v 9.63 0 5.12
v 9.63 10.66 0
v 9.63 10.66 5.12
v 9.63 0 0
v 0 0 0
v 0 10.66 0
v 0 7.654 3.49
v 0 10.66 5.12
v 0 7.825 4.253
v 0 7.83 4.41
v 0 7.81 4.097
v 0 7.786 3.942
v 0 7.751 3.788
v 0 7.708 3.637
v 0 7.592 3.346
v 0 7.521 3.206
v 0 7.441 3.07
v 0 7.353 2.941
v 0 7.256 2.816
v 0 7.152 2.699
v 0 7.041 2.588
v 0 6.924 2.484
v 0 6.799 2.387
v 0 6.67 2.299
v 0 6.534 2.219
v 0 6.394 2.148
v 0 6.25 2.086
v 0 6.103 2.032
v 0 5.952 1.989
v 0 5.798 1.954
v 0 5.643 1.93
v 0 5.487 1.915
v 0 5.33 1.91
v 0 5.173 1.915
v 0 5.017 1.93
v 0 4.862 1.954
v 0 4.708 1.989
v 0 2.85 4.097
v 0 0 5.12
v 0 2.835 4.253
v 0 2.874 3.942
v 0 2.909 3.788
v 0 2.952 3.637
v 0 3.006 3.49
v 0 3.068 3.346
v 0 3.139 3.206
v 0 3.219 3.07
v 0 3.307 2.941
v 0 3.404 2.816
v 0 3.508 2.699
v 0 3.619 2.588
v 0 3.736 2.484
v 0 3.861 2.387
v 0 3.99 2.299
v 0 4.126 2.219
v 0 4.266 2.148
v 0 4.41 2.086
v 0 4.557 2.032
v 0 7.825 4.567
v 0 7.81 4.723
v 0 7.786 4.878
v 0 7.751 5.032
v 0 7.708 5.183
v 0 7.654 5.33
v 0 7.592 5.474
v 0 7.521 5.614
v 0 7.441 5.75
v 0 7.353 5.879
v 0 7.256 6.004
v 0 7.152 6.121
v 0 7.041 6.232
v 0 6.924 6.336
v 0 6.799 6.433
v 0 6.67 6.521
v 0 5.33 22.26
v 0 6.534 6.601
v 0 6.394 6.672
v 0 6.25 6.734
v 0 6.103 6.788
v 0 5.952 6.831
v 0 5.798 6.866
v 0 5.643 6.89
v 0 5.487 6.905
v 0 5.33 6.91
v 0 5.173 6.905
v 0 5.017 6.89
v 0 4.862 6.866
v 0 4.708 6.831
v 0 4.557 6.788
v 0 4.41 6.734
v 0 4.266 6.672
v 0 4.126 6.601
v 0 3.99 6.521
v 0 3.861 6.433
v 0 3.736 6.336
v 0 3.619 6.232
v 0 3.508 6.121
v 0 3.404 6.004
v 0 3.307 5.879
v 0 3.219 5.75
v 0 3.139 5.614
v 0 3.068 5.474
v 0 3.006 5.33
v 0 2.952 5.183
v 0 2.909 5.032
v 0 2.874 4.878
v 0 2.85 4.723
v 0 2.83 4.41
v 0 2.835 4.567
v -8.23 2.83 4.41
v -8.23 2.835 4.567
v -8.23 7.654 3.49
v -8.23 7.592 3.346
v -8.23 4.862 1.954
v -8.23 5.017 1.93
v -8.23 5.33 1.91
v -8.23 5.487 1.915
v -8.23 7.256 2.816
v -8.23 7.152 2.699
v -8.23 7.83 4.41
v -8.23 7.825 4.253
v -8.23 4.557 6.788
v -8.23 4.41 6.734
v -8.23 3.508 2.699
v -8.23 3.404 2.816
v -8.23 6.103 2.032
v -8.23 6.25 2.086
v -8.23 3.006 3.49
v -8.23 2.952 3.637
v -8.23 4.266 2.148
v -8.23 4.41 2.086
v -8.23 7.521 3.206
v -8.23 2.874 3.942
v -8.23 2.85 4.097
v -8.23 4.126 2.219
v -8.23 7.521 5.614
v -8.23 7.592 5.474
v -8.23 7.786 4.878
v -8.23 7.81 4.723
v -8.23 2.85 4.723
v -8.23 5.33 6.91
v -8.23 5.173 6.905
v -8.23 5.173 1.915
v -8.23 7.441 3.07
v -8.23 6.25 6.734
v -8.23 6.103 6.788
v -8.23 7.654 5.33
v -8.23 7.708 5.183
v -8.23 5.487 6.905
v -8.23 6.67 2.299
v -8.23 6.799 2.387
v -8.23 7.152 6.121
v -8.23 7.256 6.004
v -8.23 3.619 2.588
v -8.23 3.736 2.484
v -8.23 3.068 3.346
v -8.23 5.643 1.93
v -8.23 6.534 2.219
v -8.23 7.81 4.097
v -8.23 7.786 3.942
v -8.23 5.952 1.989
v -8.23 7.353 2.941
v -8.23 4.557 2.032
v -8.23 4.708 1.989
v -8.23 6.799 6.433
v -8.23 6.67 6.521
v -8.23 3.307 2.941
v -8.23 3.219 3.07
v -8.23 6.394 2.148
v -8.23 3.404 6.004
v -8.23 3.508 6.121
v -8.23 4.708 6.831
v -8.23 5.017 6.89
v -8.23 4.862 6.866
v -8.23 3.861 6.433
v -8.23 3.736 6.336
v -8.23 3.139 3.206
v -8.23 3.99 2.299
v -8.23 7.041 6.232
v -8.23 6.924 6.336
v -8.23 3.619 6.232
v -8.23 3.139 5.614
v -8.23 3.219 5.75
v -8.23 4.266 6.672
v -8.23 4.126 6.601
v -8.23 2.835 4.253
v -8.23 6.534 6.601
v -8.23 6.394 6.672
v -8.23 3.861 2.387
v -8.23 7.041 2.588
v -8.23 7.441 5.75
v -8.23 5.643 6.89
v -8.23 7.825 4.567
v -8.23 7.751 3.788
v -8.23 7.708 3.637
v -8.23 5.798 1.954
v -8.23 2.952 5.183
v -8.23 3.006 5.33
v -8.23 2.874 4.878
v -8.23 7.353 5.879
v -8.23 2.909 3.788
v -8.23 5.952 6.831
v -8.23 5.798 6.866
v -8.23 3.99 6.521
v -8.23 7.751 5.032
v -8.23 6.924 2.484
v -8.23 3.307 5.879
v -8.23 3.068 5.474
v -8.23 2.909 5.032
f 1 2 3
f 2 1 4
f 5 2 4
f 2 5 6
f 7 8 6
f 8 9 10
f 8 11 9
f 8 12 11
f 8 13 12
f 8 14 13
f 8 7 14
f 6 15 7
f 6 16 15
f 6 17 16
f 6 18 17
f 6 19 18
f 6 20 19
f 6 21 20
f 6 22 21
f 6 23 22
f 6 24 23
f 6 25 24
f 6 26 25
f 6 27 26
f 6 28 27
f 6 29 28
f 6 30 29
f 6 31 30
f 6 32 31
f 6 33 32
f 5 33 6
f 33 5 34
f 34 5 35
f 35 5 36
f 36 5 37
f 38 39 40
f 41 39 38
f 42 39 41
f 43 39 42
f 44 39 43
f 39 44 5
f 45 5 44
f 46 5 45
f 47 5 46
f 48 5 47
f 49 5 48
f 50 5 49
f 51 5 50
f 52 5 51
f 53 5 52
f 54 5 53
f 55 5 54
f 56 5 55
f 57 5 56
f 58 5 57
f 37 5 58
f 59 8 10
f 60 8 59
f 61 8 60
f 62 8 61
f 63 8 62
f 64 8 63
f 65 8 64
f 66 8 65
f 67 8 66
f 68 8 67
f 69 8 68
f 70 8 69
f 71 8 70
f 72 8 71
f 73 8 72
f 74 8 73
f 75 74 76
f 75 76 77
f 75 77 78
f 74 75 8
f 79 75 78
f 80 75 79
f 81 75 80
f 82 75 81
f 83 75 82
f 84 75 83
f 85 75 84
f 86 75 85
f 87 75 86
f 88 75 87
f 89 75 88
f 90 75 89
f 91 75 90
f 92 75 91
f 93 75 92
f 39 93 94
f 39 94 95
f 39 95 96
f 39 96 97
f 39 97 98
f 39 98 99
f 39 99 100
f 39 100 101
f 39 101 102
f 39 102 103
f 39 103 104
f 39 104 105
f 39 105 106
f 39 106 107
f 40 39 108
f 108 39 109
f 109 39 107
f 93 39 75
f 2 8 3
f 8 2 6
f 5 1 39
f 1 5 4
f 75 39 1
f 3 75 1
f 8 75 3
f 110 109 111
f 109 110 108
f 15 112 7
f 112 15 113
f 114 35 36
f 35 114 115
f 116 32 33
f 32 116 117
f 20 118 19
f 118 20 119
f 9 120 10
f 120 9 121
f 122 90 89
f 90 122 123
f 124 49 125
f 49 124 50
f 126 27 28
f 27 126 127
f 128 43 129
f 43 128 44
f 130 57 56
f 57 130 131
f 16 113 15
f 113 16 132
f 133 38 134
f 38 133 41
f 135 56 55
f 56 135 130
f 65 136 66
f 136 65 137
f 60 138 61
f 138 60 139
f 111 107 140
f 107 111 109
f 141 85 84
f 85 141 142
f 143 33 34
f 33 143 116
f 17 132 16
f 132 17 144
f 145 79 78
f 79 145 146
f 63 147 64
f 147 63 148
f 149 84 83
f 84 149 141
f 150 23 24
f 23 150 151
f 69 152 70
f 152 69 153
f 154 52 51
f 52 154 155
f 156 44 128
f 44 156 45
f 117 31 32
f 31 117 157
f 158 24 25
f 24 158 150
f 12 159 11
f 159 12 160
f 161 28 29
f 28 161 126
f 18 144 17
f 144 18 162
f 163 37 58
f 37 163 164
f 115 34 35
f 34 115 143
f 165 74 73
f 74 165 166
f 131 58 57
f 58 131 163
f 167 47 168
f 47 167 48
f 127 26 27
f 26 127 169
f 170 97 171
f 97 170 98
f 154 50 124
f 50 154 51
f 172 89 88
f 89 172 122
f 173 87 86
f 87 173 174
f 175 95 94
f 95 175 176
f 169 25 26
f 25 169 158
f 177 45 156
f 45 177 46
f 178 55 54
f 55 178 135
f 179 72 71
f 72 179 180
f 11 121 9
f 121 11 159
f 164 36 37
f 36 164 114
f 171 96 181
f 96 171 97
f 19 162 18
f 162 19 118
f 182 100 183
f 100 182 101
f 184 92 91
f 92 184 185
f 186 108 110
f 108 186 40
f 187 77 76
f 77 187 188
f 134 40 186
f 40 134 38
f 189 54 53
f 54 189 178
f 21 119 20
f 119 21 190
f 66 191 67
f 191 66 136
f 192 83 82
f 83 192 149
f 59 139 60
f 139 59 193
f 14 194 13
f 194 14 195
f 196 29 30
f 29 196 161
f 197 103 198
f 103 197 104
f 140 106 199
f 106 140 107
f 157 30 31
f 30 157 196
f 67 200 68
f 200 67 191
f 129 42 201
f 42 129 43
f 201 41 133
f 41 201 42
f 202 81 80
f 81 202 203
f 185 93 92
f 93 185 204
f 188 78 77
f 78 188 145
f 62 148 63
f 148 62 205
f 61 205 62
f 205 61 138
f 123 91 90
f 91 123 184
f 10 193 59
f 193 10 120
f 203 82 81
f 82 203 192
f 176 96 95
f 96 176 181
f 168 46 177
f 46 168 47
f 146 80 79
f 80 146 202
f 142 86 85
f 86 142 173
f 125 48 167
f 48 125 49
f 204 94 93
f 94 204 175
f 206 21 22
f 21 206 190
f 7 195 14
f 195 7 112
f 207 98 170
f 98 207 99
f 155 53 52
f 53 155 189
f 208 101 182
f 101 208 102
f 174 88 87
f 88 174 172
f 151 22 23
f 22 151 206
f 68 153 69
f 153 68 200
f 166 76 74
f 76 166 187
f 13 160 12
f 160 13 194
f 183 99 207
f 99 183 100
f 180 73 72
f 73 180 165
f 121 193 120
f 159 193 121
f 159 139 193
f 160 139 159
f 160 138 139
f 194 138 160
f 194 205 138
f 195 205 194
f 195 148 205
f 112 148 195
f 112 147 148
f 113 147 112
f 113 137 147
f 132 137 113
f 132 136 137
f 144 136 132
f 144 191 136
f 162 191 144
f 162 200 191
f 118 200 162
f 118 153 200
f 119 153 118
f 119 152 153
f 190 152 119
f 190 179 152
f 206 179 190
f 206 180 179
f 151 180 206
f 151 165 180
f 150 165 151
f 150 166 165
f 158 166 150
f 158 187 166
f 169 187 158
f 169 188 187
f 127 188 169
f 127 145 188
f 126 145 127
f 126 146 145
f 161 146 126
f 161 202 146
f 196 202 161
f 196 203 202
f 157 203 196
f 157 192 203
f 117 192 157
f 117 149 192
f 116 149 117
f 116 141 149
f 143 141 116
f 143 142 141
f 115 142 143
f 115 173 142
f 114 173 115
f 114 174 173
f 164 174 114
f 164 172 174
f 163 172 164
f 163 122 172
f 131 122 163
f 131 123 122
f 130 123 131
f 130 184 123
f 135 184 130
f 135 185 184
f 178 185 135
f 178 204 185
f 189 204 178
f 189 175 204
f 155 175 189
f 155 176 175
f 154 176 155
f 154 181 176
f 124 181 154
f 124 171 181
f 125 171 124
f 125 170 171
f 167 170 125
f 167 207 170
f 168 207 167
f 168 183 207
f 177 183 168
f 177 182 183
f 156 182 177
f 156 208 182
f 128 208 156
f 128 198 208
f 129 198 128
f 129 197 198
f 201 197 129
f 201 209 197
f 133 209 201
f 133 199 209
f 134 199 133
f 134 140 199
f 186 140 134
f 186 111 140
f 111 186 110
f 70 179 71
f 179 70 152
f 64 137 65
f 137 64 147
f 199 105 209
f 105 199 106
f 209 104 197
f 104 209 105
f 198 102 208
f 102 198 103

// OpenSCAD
baseL = 10.66;
baseW = 9.63;
baseH = 5.12;
height = 17.14;
pinCenter = 4.41;
pinL = 8.23;
pinD = 5;

union() {
    cube([baseW, baseL, baseH]);

    // Define the vertices of the pyramid
    vertices = [
        [0, 0, 0],  // Base - Bottom left corner
        [baseW, 0, 0], // Base - Bottom right corner
        [baseW, baseL, 0],// Base - Top right corner
        [0, baseL, 0], // Base - Top left corner
        [0, baseL/2, height]  // Apex of the pyramid
    ];

    // Define the faces of the pyramid
    faces = [
        [0, 1, 4], // Side 1
        [1, 2, 4], // Side 2
        [2, 3, 4], // Side 3
        [3, 0, 4], // Side 4
        [3, 2, 1, 0] // Base
    ];

    translate([0, 0, baseH]) {
        // Create the pyramid using the polyhedron function
        polyhedron(points = vertices, faces = faces);
    }


    translate([-pinL/2, baseL/2, pinCenter]) {
        rotate([0, 90, 0]) {
            cylinder(h=pinL, d=pinD, center=true, $fn=100);
        }
    }
}
